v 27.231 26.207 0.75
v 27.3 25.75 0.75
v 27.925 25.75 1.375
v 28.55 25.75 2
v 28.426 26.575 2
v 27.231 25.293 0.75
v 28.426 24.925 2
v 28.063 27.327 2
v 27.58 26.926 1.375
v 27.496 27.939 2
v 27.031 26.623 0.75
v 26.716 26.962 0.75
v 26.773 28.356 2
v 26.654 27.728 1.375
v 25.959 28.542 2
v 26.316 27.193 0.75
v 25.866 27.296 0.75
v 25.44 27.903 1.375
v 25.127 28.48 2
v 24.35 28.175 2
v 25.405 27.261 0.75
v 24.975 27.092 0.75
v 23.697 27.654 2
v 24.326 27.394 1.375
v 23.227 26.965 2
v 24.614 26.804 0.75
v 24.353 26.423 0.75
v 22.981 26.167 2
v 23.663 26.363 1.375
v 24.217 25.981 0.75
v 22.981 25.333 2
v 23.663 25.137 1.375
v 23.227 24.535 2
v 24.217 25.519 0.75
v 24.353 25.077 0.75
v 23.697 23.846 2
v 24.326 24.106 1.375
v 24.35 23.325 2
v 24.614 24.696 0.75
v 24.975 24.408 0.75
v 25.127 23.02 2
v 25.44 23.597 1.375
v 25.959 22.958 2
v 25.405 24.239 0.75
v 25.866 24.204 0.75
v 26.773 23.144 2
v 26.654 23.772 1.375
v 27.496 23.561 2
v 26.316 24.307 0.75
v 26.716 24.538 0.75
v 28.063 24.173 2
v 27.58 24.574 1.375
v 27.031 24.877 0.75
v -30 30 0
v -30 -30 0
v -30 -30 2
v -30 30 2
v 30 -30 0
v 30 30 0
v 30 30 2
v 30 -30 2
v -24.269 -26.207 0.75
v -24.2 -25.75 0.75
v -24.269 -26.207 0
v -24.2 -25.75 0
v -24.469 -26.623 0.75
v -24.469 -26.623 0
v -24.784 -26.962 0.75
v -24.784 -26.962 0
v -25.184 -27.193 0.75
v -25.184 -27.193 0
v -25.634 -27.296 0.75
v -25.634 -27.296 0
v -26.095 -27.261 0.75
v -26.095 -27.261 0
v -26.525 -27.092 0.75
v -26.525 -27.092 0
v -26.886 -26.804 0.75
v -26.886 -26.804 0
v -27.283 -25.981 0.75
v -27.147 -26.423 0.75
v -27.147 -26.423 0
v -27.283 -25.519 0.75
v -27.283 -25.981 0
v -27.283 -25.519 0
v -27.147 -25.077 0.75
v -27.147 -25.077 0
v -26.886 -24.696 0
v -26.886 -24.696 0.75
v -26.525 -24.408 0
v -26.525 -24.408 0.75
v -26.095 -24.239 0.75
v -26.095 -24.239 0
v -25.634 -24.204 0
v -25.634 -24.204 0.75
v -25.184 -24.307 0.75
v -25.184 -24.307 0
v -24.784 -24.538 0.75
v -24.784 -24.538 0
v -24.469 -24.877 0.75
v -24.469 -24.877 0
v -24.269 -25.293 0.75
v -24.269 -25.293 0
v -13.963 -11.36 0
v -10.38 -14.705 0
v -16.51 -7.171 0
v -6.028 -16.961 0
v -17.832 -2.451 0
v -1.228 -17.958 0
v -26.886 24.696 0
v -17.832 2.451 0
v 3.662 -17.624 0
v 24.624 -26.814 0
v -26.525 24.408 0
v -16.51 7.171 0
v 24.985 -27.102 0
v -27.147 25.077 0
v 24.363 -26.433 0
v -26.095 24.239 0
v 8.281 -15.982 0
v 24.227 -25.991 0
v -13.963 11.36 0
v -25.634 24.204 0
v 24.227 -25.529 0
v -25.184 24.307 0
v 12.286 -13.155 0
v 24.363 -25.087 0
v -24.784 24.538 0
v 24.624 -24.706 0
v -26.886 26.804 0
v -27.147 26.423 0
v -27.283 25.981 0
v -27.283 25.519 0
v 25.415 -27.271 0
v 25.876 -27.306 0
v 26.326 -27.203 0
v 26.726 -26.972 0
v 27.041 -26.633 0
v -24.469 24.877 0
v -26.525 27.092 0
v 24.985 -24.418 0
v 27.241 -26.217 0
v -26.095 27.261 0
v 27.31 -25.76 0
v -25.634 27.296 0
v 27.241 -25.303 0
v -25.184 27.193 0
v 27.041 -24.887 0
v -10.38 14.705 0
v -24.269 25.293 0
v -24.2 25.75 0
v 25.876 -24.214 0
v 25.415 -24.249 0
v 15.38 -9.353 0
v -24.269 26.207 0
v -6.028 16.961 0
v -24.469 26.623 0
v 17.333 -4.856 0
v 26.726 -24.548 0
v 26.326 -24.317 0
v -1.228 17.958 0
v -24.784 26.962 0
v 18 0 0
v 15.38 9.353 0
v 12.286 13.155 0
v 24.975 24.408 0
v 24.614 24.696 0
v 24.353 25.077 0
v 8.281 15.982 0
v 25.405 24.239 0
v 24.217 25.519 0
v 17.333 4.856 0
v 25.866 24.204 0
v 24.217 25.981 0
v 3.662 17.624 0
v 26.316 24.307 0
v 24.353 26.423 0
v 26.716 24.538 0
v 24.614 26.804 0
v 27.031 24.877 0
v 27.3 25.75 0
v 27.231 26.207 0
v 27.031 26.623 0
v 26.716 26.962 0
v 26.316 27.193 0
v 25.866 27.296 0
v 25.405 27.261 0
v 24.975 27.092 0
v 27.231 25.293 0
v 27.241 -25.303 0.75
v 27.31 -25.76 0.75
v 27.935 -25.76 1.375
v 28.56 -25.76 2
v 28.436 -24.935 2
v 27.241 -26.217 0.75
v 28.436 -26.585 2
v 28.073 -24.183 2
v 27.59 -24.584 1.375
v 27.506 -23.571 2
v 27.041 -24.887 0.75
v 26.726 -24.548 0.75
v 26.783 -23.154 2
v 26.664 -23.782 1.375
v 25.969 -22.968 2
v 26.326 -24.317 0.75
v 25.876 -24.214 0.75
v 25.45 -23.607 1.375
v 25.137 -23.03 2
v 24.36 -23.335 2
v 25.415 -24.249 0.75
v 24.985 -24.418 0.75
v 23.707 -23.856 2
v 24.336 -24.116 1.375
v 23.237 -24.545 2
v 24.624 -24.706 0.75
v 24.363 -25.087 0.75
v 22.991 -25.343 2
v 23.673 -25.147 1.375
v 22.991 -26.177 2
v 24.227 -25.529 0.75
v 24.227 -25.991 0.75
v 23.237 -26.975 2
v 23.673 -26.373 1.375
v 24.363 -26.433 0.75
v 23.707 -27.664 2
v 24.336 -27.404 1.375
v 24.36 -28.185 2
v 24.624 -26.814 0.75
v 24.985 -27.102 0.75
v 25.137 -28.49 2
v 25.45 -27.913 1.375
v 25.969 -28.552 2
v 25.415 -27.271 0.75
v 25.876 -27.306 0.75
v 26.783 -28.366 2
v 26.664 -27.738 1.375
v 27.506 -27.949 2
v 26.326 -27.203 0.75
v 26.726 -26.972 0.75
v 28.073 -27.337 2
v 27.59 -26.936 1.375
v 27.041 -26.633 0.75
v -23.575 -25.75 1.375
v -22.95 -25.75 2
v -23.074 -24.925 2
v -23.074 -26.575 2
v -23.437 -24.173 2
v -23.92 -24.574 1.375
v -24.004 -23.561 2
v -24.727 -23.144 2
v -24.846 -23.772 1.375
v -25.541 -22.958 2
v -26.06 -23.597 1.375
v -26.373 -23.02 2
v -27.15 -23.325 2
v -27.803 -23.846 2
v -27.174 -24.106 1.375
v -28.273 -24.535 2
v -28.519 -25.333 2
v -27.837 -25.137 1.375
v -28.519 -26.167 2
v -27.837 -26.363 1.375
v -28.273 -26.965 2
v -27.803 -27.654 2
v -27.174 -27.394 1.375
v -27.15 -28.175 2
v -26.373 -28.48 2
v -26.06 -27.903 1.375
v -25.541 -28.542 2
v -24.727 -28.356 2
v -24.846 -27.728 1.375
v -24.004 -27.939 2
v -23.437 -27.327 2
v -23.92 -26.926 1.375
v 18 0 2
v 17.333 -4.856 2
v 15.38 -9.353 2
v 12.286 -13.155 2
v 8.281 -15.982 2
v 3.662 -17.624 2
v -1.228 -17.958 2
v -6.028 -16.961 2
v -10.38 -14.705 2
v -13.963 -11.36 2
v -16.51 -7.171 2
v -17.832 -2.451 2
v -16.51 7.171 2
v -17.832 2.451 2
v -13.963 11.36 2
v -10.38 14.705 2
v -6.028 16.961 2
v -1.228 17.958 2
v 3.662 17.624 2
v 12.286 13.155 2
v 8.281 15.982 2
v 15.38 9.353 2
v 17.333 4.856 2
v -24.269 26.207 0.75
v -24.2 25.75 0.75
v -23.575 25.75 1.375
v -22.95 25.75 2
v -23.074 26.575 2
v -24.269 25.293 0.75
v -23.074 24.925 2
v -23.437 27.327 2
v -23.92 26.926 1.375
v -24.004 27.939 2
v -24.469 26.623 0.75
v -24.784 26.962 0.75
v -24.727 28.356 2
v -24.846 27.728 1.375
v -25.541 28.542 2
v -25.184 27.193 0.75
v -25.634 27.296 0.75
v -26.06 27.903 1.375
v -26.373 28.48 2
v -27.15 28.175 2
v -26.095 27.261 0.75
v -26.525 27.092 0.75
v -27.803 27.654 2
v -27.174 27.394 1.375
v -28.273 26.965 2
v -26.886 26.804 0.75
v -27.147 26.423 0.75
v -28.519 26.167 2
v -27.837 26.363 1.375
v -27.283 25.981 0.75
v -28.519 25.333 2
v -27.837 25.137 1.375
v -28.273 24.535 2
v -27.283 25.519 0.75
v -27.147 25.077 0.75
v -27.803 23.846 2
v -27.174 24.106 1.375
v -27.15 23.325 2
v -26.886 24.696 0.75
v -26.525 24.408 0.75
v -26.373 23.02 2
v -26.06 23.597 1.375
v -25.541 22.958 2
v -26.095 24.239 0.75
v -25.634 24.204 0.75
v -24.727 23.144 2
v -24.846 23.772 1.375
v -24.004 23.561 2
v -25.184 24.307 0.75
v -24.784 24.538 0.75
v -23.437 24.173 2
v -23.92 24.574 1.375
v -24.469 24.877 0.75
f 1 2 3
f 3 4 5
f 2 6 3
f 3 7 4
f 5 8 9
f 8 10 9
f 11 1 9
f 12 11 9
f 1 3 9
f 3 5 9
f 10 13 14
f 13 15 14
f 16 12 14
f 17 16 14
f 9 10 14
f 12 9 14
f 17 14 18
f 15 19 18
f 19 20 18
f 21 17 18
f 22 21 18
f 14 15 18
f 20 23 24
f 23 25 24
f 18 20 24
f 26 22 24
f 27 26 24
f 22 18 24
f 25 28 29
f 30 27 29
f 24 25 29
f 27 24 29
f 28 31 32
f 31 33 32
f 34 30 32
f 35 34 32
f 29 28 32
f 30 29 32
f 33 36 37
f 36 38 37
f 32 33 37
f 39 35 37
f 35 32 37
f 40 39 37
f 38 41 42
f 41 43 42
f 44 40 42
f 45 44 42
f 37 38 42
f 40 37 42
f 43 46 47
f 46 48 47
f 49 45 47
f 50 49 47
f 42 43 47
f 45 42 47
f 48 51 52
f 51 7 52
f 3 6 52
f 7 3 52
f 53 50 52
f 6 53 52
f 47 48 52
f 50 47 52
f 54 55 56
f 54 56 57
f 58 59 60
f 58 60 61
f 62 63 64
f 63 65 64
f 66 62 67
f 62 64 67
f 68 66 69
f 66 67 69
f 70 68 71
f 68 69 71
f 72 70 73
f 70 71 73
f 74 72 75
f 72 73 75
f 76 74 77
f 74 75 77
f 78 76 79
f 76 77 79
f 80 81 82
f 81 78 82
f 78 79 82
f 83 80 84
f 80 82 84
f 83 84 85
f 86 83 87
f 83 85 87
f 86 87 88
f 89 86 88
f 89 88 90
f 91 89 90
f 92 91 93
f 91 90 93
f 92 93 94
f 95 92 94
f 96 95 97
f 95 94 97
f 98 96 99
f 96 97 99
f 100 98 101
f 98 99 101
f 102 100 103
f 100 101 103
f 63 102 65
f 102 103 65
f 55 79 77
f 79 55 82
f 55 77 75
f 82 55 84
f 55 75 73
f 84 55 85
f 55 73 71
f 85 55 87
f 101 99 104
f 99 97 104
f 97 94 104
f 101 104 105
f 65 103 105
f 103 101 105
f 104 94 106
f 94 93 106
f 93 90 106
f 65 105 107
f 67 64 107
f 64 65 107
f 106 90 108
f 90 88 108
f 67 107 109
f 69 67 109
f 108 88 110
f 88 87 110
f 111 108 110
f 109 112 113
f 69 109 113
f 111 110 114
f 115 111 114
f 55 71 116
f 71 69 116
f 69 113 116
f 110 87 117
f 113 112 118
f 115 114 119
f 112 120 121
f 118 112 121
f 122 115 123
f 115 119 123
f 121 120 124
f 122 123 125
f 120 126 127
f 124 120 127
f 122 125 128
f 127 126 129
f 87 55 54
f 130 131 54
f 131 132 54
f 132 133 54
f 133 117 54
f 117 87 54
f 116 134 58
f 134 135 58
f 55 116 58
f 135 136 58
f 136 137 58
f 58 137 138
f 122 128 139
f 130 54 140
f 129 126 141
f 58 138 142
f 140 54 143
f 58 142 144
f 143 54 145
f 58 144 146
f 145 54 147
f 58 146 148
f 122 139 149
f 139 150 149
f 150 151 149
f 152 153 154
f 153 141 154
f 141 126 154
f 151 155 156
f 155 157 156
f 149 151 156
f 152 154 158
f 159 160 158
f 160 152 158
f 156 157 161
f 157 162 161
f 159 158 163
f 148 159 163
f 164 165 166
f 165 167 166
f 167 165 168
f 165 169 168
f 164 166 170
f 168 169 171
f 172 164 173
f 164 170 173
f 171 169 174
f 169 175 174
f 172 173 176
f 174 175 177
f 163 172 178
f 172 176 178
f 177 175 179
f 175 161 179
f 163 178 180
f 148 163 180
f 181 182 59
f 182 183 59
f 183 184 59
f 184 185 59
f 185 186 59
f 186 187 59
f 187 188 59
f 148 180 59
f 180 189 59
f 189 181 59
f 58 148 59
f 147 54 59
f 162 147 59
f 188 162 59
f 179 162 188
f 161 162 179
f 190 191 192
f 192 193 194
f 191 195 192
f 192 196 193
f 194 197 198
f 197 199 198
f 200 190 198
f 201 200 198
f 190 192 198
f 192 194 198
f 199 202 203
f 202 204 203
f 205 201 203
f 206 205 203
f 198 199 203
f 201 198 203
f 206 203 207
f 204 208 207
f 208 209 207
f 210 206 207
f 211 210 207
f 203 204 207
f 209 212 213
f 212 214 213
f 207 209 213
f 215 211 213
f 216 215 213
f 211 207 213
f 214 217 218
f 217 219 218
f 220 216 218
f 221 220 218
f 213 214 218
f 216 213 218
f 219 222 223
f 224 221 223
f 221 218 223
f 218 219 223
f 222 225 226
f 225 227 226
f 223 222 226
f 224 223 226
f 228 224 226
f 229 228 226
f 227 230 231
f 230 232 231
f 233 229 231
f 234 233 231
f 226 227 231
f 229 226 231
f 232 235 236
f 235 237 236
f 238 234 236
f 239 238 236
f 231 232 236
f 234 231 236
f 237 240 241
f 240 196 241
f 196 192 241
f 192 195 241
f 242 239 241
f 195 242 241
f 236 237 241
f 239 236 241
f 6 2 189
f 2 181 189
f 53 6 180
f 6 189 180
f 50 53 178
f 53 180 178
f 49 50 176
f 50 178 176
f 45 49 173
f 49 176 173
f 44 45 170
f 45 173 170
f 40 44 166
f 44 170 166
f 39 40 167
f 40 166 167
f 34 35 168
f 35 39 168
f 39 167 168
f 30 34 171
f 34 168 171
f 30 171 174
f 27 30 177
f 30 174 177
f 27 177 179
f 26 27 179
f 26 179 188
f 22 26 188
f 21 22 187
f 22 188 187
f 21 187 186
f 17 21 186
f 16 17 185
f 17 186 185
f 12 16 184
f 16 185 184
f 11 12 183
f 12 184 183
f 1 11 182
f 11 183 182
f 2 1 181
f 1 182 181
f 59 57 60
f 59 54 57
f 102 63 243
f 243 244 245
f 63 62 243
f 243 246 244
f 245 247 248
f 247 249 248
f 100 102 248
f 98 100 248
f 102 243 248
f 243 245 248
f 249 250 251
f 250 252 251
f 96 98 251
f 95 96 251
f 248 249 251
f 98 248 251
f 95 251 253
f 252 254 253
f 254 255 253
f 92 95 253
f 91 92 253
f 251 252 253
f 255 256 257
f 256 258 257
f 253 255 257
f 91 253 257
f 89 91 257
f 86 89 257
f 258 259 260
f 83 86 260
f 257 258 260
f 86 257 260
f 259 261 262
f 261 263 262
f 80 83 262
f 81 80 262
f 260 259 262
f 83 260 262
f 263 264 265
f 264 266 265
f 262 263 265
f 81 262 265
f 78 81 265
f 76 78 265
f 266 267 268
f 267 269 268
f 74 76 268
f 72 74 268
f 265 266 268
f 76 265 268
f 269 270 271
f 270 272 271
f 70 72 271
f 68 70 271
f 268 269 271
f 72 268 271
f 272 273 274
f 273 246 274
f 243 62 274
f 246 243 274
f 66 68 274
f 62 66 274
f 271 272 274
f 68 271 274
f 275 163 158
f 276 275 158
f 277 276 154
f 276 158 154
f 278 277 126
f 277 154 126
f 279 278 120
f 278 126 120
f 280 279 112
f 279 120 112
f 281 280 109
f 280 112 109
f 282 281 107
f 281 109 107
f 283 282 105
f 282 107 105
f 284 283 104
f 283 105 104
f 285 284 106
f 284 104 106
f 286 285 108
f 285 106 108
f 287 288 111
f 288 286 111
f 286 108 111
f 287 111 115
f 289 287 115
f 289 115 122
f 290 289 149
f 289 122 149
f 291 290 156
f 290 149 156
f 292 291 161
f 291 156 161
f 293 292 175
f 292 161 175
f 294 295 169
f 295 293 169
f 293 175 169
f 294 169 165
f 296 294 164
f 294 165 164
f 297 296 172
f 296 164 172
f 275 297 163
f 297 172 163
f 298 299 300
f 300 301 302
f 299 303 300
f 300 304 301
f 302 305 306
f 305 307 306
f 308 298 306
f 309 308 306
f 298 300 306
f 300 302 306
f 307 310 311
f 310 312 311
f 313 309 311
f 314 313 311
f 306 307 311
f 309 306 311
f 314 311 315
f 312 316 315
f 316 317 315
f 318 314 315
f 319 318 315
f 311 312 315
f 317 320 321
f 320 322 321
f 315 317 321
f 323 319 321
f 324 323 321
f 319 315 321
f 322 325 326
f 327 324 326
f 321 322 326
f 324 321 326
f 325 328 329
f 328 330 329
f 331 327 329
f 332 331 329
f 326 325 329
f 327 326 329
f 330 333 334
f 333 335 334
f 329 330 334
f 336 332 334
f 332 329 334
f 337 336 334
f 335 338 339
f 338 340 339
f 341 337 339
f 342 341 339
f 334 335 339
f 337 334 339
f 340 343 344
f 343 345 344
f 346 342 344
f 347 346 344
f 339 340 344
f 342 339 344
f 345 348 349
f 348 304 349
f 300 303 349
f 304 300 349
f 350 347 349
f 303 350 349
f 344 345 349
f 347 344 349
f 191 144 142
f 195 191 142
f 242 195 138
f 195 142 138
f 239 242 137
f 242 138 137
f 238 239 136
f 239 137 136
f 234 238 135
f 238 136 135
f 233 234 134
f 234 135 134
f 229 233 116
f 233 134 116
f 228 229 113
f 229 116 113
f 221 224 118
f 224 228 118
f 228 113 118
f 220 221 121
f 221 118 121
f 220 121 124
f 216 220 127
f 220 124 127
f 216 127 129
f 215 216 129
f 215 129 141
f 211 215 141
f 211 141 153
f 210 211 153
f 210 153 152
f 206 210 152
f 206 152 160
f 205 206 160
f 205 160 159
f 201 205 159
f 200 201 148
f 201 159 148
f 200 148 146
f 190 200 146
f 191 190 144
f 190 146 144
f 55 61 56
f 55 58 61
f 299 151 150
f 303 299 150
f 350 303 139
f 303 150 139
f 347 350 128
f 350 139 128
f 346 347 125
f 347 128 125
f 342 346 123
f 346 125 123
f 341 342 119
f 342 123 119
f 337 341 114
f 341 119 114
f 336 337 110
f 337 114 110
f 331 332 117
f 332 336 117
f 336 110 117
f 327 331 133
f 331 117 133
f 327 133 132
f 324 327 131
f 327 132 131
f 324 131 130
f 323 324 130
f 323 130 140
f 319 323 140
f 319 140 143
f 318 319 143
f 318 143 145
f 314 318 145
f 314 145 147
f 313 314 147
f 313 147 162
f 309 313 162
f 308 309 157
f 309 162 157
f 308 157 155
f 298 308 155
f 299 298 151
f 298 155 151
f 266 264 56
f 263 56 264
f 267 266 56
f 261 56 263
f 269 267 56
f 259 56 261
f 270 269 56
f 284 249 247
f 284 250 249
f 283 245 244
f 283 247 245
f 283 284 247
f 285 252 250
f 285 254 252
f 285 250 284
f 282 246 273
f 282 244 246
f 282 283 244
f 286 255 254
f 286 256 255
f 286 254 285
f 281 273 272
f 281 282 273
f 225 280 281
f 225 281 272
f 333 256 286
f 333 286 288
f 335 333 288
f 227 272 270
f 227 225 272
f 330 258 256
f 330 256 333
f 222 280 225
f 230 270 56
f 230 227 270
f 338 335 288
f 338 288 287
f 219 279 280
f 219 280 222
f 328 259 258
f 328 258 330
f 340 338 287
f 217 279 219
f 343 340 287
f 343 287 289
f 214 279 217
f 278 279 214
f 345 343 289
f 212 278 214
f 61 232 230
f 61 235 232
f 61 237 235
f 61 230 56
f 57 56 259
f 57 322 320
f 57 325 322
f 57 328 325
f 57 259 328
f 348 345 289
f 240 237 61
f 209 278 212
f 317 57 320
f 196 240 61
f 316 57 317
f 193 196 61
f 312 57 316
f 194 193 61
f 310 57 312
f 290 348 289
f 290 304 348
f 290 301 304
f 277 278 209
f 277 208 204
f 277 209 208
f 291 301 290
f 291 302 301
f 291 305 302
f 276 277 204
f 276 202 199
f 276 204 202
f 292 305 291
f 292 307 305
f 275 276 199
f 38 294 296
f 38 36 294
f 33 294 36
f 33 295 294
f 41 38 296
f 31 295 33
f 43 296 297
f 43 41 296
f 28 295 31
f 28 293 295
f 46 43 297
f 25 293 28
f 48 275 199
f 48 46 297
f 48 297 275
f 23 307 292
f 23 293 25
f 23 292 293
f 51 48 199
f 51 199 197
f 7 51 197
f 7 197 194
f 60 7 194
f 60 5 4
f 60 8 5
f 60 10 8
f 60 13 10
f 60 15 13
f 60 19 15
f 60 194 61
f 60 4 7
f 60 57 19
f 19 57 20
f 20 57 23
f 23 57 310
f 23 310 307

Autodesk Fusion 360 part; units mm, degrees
sketch "Sketch1" plane through (0, 0, 0) normal (0, 0, 1) x (1, 0, 0)
  line L0 (-30, 30) -> (30, 30)
  line L1 (30, 30) -> (30, -30)
  line L2 (30, -30) -> (-30, -30)
  line L3 (-30, -30) -> (-30, 30)
  line L4 (-30, 30) -> (30, -30) construction
  line L5 (30, 30) -> (-30, -30) construction
  circle A0 centre (-25.75, 25.75) radius 1.55
  circle A1 centre (25.75, 25.75) radius 1.55
  circle A2 centre (25.76, -25.76) radius 1.55
  circle A3 centre (-25.75, -25.75) radius 1.55
  circle A4 centre (0, 0) radius 18
  dimension "d1" = 60
  dimension "d2" = 60
  dimension "d3" = 3.1
  dimension "d4" = 3.1
  dimension "d5" = 3.1
  dimension "d6" = 3.1
  dimension "d7" = 4.24
  dimension "d8" = 4.25
  dimension "d9" = 4.25
  dimension "d10" = 4.25
  dimension "d11" = 36
extrude "Extrude1" add sketch "Sketch1" along normal blind 2
chamfer "Chamfer1" distance 1.25 angle 45 4 edges at (-27.1951, 26.3105, 2) (24.3049, 26.3105, 2) (24.3149, -25.1995, 2) (-27.1951, -25.1895, 2)
